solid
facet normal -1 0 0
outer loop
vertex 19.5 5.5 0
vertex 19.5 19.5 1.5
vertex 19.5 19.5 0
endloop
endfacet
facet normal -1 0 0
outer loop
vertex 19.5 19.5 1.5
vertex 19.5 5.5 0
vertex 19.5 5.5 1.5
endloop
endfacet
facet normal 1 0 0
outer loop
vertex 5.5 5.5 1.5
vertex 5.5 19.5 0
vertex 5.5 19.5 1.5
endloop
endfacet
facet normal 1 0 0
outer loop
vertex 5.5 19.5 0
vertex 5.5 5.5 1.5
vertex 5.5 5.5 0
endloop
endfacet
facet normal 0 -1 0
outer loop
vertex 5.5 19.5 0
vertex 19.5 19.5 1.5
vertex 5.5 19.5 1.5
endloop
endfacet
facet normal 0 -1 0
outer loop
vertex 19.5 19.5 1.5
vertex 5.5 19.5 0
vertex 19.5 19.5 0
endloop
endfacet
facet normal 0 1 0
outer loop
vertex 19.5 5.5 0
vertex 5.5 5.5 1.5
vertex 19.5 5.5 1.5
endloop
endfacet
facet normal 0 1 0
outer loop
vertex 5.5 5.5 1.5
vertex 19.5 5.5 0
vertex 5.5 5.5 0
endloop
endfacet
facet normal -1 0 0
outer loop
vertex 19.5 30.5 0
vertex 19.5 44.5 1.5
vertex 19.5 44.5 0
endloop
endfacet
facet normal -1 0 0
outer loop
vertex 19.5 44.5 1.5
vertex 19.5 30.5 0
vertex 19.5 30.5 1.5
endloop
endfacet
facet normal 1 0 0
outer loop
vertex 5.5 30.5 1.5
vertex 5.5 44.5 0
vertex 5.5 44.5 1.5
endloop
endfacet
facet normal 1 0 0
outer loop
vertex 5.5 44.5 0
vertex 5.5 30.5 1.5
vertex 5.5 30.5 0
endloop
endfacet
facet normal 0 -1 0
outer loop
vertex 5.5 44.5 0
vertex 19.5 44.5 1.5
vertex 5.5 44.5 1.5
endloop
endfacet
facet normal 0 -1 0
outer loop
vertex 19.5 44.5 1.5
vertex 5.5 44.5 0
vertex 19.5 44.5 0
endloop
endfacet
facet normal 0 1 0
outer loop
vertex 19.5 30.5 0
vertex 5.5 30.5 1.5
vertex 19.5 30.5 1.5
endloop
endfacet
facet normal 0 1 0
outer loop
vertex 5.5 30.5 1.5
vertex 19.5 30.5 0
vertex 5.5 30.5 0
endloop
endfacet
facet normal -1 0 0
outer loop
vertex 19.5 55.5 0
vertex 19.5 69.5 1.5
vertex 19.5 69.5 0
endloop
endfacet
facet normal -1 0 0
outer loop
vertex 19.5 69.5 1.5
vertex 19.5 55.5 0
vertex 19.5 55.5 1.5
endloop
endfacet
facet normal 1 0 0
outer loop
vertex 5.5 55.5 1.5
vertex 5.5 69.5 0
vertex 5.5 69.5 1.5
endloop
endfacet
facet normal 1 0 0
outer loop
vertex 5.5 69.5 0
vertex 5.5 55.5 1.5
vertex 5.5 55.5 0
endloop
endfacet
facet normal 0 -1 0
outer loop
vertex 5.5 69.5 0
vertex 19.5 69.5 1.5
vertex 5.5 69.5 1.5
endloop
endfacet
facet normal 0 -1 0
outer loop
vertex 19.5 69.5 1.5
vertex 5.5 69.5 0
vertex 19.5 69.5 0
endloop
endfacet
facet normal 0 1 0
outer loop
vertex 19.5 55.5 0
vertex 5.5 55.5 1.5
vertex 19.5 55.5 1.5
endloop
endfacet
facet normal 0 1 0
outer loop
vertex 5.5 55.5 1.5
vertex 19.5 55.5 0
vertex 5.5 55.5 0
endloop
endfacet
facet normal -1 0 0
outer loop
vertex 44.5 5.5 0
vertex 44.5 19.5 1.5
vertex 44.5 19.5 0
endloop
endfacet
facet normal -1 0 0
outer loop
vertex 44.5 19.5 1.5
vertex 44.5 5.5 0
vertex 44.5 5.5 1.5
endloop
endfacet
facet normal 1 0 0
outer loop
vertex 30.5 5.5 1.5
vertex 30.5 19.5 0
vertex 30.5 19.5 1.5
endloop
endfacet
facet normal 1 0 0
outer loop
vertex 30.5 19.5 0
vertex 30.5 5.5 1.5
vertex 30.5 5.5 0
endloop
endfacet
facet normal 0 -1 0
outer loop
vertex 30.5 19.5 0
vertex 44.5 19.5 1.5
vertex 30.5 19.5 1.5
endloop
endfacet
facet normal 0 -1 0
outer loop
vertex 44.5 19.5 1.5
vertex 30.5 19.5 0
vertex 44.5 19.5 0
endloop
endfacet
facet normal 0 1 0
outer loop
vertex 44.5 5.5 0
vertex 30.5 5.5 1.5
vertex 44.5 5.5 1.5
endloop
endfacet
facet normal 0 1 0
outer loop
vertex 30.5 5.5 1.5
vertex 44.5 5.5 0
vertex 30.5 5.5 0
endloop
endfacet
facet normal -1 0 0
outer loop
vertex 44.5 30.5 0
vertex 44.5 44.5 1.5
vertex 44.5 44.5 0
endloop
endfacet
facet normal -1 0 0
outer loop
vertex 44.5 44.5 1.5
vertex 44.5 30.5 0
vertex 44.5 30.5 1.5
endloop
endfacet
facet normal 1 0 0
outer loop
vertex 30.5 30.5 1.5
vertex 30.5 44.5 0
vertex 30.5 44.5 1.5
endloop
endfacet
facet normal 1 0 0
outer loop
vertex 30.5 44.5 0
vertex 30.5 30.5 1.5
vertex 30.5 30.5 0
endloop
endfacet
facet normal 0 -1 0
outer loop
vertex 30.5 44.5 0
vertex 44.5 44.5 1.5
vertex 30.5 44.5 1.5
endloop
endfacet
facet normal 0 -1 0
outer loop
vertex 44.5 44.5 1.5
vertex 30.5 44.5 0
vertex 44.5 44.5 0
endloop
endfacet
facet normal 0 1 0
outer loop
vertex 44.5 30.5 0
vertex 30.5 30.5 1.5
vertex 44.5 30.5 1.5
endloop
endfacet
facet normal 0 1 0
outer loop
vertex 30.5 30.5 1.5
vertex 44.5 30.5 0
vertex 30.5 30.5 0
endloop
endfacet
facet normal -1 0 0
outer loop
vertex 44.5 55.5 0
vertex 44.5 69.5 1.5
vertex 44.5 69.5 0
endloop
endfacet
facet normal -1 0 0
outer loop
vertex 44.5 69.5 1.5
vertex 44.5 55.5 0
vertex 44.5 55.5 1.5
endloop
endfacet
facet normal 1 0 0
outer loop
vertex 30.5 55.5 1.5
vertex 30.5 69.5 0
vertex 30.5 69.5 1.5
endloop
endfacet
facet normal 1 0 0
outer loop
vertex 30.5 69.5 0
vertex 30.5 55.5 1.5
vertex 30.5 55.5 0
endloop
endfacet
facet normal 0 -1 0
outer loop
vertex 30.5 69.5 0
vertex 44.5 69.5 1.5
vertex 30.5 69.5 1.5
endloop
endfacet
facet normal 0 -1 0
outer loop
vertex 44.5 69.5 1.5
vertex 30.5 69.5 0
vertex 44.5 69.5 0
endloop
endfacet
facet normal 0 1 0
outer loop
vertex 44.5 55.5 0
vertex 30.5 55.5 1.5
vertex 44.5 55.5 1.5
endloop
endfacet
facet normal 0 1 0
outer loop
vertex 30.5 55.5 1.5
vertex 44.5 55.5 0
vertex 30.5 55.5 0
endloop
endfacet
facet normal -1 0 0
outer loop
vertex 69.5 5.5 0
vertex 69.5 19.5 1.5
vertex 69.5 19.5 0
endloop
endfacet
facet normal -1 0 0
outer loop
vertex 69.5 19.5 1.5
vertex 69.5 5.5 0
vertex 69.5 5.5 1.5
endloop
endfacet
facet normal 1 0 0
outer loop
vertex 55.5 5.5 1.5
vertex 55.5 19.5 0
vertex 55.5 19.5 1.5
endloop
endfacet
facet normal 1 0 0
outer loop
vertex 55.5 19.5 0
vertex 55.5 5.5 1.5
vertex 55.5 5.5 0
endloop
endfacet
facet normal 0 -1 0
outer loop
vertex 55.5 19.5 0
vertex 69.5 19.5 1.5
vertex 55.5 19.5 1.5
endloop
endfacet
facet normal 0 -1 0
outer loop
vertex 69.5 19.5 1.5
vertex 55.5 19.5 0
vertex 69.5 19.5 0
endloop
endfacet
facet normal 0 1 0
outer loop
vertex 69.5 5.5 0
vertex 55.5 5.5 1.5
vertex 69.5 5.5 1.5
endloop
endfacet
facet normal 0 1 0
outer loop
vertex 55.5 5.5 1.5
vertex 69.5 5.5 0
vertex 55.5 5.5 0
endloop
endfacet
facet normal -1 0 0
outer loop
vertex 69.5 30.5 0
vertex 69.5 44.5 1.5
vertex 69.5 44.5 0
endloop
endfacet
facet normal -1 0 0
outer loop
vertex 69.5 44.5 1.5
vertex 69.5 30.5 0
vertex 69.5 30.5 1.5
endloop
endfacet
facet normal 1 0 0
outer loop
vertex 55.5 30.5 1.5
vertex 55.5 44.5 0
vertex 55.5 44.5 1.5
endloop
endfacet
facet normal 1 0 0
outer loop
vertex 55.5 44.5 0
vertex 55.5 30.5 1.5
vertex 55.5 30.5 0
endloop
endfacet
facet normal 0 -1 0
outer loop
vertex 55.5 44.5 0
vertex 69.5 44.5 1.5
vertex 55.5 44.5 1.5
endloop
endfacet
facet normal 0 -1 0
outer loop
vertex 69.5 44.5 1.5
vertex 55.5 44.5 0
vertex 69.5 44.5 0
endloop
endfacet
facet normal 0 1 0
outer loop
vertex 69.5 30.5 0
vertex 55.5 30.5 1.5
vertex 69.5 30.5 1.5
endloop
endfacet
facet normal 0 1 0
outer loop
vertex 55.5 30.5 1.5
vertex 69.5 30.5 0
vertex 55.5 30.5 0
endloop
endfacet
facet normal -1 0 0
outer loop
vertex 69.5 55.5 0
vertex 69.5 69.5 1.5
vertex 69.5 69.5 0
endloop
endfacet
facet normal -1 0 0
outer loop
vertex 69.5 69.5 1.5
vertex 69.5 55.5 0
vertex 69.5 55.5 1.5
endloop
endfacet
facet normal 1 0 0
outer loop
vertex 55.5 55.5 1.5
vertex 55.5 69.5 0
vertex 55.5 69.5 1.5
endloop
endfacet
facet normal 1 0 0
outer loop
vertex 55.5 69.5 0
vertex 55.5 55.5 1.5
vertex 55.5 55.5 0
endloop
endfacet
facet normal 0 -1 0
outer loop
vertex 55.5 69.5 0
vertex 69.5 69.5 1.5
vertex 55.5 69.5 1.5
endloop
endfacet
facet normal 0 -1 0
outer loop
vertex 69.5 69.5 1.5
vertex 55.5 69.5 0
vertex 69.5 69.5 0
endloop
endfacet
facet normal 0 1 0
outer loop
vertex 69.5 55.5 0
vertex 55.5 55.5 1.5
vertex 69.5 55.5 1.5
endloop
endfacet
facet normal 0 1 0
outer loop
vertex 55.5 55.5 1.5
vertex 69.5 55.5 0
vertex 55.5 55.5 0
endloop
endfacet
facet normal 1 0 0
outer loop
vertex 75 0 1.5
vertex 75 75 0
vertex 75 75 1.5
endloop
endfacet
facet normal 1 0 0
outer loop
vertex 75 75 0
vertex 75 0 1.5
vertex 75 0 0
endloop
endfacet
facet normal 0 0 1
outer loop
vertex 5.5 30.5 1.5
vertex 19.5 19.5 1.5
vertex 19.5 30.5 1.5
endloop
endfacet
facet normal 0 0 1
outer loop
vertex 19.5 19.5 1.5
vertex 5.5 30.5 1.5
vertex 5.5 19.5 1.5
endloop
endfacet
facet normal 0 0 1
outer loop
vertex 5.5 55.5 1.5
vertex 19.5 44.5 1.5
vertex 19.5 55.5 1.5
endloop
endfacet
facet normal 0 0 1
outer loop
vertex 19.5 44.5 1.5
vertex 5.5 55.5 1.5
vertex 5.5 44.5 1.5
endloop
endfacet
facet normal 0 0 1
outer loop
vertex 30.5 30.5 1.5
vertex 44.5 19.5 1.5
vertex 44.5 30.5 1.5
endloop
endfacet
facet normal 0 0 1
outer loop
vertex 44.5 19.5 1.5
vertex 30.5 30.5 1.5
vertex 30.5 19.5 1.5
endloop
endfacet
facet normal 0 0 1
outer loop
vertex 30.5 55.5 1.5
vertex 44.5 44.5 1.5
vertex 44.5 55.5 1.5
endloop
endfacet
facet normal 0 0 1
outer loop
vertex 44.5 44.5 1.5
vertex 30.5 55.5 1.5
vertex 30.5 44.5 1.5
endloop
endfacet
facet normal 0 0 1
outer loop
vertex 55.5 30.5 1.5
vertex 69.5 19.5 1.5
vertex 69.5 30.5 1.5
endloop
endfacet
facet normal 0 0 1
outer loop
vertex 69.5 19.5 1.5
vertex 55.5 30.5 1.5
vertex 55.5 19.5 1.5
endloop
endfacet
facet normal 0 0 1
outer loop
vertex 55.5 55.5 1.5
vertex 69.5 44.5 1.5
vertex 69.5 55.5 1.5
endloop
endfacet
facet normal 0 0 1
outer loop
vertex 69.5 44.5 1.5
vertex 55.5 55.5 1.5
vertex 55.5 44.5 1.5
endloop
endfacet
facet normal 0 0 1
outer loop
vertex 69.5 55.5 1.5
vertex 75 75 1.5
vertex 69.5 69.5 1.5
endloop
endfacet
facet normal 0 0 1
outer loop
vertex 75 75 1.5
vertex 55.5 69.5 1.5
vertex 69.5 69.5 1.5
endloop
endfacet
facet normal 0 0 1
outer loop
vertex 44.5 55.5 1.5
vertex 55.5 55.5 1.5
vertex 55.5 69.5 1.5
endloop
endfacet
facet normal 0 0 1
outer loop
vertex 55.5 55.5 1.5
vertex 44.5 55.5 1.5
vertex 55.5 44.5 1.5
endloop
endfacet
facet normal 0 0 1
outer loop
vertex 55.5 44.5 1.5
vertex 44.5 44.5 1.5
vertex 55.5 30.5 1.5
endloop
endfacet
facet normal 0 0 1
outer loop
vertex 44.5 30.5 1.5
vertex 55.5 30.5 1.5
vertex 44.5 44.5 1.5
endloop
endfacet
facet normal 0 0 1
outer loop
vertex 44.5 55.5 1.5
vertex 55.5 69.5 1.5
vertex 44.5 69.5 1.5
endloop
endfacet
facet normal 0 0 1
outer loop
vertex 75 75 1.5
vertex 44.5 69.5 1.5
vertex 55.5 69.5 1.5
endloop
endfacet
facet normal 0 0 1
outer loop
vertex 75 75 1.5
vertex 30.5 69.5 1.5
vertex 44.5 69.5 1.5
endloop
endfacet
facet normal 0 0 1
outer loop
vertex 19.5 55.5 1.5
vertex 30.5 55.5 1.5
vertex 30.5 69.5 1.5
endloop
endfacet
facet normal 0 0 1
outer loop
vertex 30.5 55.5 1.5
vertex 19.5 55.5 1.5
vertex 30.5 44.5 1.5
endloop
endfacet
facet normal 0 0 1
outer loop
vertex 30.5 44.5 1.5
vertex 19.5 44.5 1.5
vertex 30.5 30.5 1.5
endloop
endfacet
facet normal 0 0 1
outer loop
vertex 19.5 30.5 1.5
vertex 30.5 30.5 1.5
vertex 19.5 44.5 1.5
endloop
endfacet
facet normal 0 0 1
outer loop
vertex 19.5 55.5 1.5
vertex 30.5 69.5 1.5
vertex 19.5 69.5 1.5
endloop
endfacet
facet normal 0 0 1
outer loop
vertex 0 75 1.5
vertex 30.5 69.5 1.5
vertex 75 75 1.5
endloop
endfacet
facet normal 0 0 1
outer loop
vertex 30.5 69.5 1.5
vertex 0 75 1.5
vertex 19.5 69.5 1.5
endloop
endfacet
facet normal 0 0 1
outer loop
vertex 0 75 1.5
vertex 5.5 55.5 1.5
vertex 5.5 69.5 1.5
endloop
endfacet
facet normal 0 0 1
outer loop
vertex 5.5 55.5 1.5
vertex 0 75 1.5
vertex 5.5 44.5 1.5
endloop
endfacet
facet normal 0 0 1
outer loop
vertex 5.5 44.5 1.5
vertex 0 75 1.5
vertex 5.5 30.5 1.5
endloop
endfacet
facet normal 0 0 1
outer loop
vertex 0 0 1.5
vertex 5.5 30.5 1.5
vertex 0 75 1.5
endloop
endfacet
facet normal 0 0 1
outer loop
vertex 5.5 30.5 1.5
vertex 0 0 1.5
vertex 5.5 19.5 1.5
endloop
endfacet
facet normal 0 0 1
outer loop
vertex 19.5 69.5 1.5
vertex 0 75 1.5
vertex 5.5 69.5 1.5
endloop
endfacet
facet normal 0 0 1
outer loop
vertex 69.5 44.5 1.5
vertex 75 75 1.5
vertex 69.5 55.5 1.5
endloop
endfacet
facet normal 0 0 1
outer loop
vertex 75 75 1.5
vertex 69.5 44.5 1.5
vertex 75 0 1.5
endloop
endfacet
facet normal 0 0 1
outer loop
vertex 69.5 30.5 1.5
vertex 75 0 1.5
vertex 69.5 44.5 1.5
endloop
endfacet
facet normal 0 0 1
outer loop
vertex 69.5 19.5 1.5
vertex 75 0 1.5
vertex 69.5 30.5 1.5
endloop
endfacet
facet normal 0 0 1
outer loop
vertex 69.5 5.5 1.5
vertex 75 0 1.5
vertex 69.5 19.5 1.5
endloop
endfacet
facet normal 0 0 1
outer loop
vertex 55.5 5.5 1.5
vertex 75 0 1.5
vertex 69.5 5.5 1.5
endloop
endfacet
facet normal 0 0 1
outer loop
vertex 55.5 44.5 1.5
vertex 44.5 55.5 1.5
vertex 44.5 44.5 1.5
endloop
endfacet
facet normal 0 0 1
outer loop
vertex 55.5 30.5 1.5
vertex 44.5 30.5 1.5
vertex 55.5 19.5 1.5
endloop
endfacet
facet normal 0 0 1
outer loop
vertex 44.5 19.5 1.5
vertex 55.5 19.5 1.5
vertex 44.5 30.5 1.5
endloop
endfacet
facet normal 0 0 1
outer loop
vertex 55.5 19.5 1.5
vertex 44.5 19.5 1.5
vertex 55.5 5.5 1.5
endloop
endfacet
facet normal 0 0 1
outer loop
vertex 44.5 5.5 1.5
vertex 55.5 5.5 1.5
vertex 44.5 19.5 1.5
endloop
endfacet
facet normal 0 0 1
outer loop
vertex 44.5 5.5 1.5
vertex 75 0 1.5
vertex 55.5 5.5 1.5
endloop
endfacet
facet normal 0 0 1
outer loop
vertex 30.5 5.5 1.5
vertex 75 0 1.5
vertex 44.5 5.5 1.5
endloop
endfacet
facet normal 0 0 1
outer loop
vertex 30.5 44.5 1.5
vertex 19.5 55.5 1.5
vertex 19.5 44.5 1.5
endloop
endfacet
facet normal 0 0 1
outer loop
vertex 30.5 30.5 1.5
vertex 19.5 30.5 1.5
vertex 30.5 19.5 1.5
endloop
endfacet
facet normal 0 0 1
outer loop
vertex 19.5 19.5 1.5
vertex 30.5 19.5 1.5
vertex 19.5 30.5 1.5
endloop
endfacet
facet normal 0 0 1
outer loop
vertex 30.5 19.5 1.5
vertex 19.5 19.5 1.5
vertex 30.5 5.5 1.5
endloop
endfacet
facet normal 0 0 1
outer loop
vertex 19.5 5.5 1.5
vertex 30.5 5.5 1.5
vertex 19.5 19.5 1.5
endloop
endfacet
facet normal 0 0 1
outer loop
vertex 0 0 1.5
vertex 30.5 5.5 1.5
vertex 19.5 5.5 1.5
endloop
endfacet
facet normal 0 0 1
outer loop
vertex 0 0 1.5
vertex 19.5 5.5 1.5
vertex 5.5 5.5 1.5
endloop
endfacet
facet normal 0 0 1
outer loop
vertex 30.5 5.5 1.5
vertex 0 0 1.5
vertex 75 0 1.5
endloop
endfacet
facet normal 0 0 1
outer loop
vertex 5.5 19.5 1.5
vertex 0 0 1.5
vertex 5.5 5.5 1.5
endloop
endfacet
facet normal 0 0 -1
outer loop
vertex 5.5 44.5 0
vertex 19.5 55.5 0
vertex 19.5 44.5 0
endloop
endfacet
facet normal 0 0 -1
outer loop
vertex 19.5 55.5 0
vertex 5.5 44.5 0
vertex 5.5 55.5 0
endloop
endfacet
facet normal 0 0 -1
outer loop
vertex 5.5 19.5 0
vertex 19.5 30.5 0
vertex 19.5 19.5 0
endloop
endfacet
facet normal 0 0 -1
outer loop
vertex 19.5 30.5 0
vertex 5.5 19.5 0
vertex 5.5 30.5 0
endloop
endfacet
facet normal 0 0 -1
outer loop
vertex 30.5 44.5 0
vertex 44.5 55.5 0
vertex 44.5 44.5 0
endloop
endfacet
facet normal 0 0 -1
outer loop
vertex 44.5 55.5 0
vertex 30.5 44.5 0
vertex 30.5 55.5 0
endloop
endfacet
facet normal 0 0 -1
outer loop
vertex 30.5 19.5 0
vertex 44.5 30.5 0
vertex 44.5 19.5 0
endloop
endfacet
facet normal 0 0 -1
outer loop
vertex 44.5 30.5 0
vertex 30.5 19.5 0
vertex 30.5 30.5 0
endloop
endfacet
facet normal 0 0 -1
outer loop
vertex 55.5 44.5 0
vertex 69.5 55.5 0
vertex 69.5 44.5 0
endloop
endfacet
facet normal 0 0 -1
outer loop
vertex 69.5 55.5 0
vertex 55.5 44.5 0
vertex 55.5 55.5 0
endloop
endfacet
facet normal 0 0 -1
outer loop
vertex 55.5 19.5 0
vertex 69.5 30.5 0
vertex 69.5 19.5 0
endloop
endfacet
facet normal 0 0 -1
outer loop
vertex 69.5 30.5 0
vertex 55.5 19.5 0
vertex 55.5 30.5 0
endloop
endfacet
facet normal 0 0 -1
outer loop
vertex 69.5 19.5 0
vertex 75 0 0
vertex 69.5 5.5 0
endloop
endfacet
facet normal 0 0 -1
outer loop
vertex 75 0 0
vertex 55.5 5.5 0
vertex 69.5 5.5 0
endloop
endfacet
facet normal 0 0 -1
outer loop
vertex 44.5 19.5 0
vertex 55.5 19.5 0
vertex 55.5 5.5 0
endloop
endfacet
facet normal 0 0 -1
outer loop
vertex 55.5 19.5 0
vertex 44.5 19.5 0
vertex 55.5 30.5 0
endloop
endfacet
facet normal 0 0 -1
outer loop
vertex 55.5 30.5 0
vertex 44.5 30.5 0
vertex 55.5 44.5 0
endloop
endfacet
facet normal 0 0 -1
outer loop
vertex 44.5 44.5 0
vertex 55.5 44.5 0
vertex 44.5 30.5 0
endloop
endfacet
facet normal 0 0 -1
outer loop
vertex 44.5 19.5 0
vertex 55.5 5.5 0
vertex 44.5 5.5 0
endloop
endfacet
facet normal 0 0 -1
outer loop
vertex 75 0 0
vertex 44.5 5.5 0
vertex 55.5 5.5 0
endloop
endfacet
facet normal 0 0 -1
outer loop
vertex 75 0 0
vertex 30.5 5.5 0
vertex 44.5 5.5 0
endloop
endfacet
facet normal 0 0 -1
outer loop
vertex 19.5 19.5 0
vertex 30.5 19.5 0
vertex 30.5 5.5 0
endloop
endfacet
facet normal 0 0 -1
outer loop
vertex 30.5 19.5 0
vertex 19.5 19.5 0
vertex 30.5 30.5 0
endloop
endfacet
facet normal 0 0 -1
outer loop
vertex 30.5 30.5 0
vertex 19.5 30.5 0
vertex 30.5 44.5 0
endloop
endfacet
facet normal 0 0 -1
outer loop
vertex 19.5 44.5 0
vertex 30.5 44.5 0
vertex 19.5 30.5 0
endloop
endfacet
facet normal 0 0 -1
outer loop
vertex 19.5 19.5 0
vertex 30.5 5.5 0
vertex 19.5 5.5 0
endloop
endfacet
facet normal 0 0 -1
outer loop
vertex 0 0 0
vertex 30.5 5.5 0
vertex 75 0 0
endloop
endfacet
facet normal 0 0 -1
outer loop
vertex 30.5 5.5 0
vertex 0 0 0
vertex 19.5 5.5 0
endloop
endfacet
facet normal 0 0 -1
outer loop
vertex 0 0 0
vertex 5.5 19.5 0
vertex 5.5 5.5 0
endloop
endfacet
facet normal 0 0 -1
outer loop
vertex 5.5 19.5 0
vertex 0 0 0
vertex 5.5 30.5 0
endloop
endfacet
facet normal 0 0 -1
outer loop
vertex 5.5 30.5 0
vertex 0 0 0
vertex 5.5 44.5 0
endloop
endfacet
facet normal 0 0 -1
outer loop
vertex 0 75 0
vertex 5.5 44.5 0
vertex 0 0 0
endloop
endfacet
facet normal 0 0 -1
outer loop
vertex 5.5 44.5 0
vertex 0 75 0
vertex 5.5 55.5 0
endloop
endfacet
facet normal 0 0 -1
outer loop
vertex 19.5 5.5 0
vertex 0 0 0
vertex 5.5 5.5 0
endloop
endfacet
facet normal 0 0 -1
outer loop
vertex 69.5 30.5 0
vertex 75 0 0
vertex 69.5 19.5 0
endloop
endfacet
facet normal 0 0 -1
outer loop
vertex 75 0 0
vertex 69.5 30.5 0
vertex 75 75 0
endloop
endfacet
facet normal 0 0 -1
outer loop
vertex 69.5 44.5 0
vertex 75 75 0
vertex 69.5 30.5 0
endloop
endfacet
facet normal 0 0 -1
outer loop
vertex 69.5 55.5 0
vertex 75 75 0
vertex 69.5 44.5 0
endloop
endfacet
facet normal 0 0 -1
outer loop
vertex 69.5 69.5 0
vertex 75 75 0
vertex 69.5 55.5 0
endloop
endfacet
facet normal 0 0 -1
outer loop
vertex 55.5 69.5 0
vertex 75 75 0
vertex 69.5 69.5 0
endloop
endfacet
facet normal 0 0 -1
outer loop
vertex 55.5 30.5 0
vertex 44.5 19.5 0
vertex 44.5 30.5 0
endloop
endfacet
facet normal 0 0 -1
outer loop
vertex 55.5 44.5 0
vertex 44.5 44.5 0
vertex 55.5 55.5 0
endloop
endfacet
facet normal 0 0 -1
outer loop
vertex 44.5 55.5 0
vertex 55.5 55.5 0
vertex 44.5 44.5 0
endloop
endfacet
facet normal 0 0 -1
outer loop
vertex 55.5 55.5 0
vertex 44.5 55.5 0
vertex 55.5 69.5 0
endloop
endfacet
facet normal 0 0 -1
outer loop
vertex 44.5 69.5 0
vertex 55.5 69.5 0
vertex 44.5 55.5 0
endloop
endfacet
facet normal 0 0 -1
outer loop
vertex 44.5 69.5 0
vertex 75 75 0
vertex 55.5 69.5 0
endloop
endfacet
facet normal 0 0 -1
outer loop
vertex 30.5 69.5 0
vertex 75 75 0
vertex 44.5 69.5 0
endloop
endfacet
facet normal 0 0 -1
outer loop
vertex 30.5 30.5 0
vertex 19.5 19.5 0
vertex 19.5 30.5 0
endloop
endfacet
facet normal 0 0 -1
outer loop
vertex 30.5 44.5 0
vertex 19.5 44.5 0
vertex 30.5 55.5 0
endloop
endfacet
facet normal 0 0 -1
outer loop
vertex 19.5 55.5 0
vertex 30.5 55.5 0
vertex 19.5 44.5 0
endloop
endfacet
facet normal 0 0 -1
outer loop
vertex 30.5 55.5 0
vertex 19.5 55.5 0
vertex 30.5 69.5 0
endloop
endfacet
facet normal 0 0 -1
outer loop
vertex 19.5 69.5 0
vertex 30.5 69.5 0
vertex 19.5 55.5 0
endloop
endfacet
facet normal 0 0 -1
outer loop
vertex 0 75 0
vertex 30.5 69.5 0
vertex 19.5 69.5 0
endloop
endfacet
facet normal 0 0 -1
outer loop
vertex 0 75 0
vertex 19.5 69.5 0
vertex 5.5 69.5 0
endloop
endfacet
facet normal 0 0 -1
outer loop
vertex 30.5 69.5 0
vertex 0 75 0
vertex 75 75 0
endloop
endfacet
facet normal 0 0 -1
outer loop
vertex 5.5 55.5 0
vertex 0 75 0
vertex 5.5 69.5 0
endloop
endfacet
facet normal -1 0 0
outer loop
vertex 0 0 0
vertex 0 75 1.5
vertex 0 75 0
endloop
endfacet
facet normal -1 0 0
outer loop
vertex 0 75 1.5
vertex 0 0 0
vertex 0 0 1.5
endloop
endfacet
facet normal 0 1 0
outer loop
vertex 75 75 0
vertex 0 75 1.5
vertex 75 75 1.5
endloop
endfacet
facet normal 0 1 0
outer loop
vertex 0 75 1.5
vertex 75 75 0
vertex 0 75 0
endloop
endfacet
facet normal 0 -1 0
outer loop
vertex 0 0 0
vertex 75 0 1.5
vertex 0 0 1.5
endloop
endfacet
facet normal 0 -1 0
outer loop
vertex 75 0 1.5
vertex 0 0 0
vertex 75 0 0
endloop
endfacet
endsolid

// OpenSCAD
key_x = 14;
key_y = key_x;

key_clearance_x = 25;
key_clearance_y = 25;

key_rows = 3;
key_columns = 3;

plate_thickness = 1.5;

dim_x = key_rows * key_clearance_x;
dim_y = key_columns * key_clearance_y;

f = 0.01;
df = 2 * f;

difference() {
    cube([dim_x, dim_y, plate_thickness]);
    for(x = [1 : key_rows]) {
        for(y = [1 : key_columns]) {
            translate([(x-1) * key_clearance_x + (key_clearance_x - key_x)/2, (y-1) * key_clearance_y + (key_clearance_y - key_y)/2, -f])
                cube([key_x, key_y, plate_thickness + df]);
        }
    }
}
